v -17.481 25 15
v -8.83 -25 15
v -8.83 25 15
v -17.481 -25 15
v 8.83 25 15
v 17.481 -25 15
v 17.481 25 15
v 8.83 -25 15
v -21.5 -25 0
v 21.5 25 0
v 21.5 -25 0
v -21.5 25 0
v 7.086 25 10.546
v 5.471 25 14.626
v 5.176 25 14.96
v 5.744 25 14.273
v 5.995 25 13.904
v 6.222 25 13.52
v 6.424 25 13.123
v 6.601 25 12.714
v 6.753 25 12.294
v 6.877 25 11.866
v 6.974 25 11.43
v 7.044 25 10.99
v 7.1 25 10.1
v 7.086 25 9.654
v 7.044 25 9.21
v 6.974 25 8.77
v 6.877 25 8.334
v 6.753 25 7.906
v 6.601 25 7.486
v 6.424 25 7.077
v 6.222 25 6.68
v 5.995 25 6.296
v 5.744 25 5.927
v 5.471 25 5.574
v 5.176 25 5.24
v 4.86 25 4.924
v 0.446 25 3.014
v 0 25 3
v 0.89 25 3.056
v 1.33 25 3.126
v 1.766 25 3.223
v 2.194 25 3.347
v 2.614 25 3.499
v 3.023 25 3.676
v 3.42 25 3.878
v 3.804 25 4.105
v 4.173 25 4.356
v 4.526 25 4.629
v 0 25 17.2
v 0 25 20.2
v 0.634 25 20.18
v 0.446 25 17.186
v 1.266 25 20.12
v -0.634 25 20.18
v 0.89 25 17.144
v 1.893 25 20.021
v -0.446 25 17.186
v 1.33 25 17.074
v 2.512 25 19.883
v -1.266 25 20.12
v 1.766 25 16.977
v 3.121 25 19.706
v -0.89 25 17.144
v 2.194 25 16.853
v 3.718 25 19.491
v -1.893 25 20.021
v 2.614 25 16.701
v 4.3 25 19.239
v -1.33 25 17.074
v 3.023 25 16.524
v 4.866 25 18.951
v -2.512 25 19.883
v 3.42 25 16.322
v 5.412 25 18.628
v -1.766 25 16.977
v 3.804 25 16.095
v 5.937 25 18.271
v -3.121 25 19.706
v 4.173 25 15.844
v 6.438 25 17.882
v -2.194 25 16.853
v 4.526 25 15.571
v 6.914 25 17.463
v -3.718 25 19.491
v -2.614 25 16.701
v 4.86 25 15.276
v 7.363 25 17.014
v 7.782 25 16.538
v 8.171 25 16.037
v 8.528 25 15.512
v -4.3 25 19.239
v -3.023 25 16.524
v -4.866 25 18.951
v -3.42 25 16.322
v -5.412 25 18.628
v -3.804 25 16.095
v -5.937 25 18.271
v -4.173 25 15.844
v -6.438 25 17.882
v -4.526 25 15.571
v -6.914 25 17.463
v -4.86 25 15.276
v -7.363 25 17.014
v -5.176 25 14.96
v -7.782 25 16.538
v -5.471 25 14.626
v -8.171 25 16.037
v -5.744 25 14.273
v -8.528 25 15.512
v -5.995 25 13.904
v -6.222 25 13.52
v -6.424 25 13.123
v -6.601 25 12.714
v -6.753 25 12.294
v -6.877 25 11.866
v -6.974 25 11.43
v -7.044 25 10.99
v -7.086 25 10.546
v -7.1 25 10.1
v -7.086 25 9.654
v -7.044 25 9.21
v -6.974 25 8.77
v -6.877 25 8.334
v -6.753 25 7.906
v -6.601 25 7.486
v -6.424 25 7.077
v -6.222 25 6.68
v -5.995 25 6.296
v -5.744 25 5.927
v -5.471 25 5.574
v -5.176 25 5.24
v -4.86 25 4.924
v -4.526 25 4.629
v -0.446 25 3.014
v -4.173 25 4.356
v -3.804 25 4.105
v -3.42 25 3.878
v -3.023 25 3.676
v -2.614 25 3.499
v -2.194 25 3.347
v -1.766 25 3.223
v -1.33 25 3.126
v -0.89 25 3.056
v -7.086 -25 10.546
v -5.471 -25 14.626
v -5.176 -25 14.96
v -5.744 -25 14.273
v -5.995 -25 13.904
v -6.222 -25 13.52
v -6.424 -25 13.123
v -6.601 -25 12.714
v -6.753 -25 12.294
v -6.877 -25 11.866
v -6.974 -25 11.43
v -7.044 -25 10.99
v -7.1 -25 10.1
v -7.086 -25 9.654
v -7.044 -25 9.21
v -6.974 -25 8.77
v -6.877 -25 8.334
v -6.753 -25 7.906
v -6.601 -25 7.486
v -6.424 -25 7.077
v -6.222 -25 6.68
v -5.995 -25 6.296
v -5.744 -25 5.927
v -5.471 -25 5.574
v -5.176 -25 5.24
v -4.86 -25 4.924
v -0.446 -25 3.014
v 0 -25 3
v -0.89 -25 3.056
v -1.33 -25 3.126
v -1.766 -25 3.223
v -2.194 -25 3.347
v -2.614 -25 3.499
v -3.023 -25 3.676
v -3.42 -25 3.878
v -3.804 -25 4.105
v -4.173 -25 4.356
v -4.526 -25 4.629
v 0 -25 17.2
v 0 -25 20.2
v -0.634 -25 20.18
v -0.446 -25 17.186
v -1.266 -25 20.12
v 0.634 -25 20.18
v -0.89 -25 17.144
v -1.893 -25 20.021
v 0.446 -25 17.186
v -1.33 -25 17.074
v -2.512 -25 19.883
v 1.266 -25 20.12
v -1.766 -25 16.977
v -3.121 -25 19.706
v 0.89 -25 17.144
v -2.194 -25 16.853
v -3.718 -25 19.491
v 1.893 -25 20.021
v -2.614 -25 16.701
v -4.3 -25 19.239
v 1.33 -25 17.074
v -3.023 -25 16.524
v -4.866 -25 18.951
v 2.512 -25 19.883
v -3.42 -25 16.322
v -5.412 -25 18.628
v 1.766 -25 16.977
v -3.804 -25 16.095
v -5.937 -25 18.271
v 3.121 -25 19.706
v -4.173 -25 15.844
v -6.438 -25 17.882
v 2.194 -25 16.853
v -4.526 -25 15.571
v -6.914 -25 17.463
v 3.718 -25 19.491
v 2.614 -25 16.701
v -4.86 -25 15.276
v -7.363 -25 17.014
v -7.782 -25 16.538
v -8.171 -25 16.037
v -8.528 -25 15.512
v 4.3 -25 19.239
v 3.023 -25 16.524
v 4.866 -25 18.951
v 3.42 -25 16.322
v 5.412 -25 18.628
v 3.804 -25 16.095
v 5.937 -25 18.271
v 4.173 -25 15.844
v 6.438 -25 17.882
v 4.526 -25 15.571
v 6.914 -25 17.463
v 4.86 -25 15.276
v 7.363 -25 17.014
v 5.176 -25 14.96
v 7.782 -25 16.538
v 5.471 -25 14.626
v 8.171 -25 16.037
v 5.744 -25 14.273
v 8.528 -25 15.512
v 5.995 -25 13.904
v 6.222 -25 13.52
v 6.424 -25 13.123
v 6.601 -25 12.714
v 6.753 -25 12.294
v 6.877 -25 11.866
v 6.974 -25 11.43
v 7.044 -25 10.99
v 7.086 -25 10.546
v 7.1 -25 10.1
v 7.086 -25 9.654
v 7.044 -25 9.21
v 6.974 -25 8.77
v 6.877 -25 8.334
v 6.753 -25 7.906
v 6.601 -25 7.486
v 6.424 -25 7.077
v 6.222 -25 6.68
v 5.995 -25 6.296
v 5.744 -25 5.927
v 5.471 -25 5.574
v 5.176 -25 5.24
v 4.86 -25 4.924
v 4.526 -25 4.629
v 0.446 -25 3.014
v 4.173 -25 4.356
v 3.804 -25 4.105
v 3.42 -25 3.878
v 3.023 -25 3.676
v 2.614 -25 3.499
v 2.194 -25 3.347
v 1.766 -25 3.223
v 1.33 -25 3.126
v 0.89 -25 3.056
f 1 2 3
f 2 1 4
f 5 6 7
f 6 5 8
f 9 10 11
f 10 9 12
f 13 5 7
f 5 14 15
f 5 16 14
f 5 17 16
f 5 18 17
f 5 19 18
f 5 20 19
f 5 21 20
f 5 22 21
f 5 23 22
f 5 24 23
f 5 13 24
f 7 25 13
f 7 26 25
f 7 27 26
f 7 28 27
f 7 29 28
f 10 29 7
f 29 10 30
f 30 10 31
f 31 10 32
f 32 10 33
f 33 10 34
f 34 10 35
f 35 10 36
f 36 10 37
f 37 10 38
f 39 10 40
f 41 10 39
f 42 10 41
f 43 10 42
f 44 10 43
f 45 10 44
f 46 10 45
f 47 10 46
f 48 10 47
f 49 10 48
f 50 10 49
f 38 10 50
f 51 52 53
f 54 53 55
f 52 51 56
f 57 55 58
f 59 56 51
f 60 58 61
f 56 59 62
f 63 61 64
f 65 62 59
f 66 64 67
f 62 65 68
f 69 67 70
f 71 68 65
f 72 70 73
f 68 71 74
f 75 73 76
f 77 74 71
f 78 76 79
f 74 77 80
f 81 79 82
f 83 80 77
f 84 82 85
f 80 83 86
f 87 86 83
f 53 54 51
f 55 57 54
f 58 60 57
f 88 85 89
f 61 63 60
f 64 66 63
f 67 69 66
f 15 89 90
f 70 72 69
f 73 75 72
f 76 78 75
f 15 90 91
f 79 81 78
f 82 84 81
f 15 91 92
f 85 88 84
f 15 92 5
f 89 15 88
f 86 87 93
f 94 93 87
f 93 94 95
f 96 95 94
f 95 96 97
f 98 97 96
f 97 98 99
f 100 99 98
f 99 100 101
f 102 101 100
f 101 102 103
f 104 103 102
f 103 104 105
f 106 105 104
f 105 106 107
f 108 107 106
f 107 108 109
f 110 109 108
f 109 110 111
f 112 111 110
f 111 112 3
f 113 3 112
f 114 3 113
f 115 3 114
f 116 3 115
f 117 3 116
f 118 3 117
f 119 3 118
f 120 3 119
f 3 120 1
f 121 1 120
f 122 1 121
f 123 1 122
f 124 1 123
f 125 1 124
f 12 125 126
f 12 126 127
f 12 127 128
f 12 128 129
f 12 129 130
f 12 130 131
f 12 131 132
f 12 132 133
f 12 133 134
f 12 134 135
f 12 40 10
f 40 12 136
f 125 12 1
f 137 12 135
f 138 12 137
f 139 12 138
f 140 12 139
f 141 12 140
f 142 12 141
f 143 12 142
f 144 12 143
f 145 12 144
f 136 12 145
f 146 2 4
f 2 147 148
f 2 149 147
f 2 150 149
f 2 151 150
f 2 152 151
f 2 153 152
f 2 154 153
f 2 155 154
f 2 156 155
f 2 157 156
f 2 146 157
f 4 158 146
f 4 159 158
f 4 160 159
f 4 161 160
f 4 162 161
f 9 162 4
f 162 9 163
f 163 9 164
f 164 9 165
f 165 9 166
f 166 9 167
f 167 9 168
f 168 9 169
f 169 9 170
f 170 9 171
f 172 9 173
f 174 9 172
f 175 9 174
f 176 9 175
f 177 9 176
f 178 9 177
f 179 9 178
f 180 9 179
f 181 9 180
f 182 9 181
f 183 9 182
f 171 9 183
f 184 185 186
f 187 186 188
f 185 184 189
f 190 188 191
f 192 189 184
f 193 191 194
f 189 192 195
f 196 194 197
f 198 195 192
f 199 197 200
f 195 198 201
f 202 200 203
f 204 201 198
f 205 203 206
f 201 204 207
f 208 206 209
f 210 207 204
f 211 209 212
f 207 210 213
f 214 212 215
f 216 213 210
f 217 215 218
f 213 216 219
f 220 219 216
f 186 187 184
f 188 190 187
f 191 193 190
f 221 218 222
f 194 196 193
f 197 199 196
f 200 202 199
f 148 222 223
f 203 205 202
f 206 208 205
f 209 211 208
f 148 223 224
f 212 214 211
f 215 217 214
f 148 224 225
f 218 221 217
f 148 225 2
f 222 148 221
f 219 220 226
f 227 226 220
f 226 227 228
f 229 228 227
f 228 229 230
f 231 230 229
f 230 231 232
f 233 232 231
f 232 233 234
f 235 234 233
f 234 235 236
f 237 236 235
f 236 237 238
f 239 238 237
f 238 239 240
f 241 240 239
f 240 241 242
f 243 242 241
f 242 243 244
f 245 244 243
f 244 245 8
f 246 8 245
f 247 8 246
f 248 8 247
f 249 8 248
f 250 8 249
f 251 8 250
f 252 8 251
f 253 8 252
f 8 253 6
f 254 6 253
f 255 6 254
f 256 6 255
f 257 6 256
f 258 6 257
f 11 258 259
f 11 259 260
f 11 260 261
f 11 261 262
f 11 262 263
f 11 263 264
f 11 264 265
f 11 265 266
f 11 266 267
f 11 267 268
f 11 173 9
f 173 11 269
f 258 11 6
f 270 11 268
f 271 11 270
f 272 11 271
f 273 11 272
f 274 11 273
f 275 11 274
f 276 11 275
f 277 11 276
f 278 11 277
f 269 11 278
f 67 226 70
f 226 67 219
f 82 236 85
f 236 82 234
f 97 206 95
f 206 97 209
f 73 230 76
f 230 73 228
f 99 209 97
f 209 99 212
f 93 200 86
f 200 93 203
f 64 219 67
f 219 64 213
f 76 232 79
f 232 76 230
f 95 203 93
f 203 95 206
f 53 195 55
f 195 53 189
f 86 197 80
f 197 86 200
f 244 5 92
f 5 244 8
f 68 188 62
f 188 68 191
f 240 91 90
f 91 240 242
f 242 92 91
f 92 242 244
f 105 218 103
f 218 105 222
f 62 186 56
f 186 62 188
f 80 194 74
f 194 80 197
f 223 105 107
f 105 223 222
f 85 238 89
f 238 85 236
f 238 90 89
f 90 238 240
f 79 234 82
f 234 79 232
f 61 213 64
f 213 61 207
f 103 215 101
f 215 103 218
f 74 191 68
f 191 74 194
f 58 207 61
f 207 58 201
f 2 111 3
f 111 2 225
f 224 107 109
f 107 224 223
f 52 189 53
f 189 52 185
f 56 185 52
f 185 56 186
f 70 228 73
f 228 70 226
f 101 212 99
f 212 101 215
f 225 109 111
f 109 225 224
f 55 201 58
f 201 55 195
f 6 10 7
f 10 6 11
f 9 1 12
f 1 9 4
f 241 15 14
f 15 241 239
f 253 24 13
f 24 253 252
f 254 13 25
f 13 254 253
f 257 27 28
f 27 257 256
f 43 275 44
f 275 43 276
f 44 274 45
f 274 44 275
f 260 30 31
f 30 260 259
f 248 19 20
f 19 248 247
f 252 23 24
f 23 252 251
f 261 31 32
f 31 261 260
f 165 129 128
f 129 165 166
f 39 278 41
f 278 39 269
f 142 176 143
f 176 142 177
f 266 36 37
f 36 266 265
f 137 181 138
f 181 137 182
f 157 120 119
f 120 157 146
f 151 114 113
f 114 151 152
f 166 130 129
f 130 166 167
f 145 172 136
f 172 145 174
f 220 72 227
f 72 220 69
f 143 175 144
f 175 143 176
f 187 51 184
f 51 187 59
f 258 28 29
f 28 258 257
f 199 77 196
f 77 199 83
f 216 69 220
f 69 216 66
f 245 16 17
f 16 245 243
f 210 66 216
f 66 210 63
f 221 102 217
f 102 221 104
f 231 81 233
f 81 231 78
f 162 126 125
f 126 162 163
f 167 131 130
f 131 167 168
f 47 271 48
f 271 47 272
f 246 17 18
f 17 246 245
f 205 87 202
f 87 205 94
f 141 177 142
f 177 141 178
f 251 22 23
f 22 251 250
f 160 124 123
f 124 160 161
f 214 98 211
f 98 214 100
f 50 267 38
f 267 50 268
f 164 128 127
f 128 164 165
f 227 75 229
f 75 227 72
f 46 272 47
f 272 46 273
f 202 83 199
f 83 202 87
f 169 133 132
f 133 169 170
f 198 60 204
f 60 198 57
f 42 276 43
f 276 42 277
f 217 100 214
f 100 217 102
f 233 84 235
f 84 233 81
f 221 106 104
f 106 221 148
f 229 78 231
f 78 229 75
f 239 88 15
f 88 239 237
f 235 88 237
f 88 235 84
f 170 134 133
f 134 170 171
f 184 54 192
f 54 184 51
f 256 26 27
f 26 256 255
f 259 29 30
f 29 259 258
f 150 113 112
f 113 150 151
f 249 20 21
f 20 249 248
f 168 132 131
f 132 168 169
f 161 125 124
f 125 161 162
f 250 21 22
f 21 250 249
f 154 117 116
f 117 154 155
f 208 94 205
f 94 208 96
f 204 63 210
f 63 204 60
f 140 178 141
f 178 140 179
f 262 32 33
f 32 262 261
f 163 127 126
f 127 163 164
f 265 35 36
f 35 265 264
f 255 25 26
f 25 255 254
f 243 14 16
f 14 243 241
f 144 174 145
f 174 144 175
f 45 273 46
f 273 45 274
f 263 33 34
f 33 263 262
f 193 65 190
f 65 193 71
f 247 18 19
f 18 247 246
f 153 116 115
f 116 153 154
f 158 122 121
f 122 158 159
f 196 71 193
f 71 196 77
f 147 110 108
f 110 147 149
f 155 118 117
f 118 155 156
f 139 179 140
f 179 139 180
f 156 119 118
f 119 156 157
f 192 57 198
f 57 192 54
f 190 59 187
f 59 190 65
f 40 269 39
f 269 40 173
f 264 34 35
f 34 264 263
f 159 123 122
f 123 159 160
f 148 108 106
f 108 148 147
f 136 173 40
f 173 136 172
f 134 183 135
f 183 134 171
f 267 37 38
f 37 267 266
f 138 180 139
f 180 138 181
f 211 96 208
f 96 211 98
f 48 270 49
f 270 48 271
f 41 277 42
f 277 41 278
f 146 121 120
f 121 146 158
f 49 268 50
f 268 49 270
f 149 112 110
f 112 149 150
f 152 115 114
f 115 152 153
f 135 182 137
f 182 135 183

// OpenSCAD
$l = 50; // lenght of vixen dovetail

$id = 14.20; // laserpointer
$od = $id + 6; // outer

$fn = 100;

$w = 43; // vixen dovetail
$h = 15; // vixen dovetail
$a = 75; // vixen dovetail

difference() {
  union() {  
    translate([-$w/2,-$l/2,0])
      cube([$w,$l,15]);
    translate([0,$l/2,$od/2])
      rotate([90,0,0])
        cylinder($l,$od/2,$od/2);
  }

  translate([$w/2,-$l/2-1,0])
    rotate([0,-90+$a,0])
      cube([10,$l+2,20]);

  translate([0,0,0])
    rotate([0,0,180])
      translate([$w/2,-$l/2-1,0])
        rotate([0,-90+$a,0])
          cube([10,$l+2,20]);

  translate([0,$l/2+1,$od/2])
    rotate([90,0,0])
      cylinder($l+2,$id/2,$id/2);
}
